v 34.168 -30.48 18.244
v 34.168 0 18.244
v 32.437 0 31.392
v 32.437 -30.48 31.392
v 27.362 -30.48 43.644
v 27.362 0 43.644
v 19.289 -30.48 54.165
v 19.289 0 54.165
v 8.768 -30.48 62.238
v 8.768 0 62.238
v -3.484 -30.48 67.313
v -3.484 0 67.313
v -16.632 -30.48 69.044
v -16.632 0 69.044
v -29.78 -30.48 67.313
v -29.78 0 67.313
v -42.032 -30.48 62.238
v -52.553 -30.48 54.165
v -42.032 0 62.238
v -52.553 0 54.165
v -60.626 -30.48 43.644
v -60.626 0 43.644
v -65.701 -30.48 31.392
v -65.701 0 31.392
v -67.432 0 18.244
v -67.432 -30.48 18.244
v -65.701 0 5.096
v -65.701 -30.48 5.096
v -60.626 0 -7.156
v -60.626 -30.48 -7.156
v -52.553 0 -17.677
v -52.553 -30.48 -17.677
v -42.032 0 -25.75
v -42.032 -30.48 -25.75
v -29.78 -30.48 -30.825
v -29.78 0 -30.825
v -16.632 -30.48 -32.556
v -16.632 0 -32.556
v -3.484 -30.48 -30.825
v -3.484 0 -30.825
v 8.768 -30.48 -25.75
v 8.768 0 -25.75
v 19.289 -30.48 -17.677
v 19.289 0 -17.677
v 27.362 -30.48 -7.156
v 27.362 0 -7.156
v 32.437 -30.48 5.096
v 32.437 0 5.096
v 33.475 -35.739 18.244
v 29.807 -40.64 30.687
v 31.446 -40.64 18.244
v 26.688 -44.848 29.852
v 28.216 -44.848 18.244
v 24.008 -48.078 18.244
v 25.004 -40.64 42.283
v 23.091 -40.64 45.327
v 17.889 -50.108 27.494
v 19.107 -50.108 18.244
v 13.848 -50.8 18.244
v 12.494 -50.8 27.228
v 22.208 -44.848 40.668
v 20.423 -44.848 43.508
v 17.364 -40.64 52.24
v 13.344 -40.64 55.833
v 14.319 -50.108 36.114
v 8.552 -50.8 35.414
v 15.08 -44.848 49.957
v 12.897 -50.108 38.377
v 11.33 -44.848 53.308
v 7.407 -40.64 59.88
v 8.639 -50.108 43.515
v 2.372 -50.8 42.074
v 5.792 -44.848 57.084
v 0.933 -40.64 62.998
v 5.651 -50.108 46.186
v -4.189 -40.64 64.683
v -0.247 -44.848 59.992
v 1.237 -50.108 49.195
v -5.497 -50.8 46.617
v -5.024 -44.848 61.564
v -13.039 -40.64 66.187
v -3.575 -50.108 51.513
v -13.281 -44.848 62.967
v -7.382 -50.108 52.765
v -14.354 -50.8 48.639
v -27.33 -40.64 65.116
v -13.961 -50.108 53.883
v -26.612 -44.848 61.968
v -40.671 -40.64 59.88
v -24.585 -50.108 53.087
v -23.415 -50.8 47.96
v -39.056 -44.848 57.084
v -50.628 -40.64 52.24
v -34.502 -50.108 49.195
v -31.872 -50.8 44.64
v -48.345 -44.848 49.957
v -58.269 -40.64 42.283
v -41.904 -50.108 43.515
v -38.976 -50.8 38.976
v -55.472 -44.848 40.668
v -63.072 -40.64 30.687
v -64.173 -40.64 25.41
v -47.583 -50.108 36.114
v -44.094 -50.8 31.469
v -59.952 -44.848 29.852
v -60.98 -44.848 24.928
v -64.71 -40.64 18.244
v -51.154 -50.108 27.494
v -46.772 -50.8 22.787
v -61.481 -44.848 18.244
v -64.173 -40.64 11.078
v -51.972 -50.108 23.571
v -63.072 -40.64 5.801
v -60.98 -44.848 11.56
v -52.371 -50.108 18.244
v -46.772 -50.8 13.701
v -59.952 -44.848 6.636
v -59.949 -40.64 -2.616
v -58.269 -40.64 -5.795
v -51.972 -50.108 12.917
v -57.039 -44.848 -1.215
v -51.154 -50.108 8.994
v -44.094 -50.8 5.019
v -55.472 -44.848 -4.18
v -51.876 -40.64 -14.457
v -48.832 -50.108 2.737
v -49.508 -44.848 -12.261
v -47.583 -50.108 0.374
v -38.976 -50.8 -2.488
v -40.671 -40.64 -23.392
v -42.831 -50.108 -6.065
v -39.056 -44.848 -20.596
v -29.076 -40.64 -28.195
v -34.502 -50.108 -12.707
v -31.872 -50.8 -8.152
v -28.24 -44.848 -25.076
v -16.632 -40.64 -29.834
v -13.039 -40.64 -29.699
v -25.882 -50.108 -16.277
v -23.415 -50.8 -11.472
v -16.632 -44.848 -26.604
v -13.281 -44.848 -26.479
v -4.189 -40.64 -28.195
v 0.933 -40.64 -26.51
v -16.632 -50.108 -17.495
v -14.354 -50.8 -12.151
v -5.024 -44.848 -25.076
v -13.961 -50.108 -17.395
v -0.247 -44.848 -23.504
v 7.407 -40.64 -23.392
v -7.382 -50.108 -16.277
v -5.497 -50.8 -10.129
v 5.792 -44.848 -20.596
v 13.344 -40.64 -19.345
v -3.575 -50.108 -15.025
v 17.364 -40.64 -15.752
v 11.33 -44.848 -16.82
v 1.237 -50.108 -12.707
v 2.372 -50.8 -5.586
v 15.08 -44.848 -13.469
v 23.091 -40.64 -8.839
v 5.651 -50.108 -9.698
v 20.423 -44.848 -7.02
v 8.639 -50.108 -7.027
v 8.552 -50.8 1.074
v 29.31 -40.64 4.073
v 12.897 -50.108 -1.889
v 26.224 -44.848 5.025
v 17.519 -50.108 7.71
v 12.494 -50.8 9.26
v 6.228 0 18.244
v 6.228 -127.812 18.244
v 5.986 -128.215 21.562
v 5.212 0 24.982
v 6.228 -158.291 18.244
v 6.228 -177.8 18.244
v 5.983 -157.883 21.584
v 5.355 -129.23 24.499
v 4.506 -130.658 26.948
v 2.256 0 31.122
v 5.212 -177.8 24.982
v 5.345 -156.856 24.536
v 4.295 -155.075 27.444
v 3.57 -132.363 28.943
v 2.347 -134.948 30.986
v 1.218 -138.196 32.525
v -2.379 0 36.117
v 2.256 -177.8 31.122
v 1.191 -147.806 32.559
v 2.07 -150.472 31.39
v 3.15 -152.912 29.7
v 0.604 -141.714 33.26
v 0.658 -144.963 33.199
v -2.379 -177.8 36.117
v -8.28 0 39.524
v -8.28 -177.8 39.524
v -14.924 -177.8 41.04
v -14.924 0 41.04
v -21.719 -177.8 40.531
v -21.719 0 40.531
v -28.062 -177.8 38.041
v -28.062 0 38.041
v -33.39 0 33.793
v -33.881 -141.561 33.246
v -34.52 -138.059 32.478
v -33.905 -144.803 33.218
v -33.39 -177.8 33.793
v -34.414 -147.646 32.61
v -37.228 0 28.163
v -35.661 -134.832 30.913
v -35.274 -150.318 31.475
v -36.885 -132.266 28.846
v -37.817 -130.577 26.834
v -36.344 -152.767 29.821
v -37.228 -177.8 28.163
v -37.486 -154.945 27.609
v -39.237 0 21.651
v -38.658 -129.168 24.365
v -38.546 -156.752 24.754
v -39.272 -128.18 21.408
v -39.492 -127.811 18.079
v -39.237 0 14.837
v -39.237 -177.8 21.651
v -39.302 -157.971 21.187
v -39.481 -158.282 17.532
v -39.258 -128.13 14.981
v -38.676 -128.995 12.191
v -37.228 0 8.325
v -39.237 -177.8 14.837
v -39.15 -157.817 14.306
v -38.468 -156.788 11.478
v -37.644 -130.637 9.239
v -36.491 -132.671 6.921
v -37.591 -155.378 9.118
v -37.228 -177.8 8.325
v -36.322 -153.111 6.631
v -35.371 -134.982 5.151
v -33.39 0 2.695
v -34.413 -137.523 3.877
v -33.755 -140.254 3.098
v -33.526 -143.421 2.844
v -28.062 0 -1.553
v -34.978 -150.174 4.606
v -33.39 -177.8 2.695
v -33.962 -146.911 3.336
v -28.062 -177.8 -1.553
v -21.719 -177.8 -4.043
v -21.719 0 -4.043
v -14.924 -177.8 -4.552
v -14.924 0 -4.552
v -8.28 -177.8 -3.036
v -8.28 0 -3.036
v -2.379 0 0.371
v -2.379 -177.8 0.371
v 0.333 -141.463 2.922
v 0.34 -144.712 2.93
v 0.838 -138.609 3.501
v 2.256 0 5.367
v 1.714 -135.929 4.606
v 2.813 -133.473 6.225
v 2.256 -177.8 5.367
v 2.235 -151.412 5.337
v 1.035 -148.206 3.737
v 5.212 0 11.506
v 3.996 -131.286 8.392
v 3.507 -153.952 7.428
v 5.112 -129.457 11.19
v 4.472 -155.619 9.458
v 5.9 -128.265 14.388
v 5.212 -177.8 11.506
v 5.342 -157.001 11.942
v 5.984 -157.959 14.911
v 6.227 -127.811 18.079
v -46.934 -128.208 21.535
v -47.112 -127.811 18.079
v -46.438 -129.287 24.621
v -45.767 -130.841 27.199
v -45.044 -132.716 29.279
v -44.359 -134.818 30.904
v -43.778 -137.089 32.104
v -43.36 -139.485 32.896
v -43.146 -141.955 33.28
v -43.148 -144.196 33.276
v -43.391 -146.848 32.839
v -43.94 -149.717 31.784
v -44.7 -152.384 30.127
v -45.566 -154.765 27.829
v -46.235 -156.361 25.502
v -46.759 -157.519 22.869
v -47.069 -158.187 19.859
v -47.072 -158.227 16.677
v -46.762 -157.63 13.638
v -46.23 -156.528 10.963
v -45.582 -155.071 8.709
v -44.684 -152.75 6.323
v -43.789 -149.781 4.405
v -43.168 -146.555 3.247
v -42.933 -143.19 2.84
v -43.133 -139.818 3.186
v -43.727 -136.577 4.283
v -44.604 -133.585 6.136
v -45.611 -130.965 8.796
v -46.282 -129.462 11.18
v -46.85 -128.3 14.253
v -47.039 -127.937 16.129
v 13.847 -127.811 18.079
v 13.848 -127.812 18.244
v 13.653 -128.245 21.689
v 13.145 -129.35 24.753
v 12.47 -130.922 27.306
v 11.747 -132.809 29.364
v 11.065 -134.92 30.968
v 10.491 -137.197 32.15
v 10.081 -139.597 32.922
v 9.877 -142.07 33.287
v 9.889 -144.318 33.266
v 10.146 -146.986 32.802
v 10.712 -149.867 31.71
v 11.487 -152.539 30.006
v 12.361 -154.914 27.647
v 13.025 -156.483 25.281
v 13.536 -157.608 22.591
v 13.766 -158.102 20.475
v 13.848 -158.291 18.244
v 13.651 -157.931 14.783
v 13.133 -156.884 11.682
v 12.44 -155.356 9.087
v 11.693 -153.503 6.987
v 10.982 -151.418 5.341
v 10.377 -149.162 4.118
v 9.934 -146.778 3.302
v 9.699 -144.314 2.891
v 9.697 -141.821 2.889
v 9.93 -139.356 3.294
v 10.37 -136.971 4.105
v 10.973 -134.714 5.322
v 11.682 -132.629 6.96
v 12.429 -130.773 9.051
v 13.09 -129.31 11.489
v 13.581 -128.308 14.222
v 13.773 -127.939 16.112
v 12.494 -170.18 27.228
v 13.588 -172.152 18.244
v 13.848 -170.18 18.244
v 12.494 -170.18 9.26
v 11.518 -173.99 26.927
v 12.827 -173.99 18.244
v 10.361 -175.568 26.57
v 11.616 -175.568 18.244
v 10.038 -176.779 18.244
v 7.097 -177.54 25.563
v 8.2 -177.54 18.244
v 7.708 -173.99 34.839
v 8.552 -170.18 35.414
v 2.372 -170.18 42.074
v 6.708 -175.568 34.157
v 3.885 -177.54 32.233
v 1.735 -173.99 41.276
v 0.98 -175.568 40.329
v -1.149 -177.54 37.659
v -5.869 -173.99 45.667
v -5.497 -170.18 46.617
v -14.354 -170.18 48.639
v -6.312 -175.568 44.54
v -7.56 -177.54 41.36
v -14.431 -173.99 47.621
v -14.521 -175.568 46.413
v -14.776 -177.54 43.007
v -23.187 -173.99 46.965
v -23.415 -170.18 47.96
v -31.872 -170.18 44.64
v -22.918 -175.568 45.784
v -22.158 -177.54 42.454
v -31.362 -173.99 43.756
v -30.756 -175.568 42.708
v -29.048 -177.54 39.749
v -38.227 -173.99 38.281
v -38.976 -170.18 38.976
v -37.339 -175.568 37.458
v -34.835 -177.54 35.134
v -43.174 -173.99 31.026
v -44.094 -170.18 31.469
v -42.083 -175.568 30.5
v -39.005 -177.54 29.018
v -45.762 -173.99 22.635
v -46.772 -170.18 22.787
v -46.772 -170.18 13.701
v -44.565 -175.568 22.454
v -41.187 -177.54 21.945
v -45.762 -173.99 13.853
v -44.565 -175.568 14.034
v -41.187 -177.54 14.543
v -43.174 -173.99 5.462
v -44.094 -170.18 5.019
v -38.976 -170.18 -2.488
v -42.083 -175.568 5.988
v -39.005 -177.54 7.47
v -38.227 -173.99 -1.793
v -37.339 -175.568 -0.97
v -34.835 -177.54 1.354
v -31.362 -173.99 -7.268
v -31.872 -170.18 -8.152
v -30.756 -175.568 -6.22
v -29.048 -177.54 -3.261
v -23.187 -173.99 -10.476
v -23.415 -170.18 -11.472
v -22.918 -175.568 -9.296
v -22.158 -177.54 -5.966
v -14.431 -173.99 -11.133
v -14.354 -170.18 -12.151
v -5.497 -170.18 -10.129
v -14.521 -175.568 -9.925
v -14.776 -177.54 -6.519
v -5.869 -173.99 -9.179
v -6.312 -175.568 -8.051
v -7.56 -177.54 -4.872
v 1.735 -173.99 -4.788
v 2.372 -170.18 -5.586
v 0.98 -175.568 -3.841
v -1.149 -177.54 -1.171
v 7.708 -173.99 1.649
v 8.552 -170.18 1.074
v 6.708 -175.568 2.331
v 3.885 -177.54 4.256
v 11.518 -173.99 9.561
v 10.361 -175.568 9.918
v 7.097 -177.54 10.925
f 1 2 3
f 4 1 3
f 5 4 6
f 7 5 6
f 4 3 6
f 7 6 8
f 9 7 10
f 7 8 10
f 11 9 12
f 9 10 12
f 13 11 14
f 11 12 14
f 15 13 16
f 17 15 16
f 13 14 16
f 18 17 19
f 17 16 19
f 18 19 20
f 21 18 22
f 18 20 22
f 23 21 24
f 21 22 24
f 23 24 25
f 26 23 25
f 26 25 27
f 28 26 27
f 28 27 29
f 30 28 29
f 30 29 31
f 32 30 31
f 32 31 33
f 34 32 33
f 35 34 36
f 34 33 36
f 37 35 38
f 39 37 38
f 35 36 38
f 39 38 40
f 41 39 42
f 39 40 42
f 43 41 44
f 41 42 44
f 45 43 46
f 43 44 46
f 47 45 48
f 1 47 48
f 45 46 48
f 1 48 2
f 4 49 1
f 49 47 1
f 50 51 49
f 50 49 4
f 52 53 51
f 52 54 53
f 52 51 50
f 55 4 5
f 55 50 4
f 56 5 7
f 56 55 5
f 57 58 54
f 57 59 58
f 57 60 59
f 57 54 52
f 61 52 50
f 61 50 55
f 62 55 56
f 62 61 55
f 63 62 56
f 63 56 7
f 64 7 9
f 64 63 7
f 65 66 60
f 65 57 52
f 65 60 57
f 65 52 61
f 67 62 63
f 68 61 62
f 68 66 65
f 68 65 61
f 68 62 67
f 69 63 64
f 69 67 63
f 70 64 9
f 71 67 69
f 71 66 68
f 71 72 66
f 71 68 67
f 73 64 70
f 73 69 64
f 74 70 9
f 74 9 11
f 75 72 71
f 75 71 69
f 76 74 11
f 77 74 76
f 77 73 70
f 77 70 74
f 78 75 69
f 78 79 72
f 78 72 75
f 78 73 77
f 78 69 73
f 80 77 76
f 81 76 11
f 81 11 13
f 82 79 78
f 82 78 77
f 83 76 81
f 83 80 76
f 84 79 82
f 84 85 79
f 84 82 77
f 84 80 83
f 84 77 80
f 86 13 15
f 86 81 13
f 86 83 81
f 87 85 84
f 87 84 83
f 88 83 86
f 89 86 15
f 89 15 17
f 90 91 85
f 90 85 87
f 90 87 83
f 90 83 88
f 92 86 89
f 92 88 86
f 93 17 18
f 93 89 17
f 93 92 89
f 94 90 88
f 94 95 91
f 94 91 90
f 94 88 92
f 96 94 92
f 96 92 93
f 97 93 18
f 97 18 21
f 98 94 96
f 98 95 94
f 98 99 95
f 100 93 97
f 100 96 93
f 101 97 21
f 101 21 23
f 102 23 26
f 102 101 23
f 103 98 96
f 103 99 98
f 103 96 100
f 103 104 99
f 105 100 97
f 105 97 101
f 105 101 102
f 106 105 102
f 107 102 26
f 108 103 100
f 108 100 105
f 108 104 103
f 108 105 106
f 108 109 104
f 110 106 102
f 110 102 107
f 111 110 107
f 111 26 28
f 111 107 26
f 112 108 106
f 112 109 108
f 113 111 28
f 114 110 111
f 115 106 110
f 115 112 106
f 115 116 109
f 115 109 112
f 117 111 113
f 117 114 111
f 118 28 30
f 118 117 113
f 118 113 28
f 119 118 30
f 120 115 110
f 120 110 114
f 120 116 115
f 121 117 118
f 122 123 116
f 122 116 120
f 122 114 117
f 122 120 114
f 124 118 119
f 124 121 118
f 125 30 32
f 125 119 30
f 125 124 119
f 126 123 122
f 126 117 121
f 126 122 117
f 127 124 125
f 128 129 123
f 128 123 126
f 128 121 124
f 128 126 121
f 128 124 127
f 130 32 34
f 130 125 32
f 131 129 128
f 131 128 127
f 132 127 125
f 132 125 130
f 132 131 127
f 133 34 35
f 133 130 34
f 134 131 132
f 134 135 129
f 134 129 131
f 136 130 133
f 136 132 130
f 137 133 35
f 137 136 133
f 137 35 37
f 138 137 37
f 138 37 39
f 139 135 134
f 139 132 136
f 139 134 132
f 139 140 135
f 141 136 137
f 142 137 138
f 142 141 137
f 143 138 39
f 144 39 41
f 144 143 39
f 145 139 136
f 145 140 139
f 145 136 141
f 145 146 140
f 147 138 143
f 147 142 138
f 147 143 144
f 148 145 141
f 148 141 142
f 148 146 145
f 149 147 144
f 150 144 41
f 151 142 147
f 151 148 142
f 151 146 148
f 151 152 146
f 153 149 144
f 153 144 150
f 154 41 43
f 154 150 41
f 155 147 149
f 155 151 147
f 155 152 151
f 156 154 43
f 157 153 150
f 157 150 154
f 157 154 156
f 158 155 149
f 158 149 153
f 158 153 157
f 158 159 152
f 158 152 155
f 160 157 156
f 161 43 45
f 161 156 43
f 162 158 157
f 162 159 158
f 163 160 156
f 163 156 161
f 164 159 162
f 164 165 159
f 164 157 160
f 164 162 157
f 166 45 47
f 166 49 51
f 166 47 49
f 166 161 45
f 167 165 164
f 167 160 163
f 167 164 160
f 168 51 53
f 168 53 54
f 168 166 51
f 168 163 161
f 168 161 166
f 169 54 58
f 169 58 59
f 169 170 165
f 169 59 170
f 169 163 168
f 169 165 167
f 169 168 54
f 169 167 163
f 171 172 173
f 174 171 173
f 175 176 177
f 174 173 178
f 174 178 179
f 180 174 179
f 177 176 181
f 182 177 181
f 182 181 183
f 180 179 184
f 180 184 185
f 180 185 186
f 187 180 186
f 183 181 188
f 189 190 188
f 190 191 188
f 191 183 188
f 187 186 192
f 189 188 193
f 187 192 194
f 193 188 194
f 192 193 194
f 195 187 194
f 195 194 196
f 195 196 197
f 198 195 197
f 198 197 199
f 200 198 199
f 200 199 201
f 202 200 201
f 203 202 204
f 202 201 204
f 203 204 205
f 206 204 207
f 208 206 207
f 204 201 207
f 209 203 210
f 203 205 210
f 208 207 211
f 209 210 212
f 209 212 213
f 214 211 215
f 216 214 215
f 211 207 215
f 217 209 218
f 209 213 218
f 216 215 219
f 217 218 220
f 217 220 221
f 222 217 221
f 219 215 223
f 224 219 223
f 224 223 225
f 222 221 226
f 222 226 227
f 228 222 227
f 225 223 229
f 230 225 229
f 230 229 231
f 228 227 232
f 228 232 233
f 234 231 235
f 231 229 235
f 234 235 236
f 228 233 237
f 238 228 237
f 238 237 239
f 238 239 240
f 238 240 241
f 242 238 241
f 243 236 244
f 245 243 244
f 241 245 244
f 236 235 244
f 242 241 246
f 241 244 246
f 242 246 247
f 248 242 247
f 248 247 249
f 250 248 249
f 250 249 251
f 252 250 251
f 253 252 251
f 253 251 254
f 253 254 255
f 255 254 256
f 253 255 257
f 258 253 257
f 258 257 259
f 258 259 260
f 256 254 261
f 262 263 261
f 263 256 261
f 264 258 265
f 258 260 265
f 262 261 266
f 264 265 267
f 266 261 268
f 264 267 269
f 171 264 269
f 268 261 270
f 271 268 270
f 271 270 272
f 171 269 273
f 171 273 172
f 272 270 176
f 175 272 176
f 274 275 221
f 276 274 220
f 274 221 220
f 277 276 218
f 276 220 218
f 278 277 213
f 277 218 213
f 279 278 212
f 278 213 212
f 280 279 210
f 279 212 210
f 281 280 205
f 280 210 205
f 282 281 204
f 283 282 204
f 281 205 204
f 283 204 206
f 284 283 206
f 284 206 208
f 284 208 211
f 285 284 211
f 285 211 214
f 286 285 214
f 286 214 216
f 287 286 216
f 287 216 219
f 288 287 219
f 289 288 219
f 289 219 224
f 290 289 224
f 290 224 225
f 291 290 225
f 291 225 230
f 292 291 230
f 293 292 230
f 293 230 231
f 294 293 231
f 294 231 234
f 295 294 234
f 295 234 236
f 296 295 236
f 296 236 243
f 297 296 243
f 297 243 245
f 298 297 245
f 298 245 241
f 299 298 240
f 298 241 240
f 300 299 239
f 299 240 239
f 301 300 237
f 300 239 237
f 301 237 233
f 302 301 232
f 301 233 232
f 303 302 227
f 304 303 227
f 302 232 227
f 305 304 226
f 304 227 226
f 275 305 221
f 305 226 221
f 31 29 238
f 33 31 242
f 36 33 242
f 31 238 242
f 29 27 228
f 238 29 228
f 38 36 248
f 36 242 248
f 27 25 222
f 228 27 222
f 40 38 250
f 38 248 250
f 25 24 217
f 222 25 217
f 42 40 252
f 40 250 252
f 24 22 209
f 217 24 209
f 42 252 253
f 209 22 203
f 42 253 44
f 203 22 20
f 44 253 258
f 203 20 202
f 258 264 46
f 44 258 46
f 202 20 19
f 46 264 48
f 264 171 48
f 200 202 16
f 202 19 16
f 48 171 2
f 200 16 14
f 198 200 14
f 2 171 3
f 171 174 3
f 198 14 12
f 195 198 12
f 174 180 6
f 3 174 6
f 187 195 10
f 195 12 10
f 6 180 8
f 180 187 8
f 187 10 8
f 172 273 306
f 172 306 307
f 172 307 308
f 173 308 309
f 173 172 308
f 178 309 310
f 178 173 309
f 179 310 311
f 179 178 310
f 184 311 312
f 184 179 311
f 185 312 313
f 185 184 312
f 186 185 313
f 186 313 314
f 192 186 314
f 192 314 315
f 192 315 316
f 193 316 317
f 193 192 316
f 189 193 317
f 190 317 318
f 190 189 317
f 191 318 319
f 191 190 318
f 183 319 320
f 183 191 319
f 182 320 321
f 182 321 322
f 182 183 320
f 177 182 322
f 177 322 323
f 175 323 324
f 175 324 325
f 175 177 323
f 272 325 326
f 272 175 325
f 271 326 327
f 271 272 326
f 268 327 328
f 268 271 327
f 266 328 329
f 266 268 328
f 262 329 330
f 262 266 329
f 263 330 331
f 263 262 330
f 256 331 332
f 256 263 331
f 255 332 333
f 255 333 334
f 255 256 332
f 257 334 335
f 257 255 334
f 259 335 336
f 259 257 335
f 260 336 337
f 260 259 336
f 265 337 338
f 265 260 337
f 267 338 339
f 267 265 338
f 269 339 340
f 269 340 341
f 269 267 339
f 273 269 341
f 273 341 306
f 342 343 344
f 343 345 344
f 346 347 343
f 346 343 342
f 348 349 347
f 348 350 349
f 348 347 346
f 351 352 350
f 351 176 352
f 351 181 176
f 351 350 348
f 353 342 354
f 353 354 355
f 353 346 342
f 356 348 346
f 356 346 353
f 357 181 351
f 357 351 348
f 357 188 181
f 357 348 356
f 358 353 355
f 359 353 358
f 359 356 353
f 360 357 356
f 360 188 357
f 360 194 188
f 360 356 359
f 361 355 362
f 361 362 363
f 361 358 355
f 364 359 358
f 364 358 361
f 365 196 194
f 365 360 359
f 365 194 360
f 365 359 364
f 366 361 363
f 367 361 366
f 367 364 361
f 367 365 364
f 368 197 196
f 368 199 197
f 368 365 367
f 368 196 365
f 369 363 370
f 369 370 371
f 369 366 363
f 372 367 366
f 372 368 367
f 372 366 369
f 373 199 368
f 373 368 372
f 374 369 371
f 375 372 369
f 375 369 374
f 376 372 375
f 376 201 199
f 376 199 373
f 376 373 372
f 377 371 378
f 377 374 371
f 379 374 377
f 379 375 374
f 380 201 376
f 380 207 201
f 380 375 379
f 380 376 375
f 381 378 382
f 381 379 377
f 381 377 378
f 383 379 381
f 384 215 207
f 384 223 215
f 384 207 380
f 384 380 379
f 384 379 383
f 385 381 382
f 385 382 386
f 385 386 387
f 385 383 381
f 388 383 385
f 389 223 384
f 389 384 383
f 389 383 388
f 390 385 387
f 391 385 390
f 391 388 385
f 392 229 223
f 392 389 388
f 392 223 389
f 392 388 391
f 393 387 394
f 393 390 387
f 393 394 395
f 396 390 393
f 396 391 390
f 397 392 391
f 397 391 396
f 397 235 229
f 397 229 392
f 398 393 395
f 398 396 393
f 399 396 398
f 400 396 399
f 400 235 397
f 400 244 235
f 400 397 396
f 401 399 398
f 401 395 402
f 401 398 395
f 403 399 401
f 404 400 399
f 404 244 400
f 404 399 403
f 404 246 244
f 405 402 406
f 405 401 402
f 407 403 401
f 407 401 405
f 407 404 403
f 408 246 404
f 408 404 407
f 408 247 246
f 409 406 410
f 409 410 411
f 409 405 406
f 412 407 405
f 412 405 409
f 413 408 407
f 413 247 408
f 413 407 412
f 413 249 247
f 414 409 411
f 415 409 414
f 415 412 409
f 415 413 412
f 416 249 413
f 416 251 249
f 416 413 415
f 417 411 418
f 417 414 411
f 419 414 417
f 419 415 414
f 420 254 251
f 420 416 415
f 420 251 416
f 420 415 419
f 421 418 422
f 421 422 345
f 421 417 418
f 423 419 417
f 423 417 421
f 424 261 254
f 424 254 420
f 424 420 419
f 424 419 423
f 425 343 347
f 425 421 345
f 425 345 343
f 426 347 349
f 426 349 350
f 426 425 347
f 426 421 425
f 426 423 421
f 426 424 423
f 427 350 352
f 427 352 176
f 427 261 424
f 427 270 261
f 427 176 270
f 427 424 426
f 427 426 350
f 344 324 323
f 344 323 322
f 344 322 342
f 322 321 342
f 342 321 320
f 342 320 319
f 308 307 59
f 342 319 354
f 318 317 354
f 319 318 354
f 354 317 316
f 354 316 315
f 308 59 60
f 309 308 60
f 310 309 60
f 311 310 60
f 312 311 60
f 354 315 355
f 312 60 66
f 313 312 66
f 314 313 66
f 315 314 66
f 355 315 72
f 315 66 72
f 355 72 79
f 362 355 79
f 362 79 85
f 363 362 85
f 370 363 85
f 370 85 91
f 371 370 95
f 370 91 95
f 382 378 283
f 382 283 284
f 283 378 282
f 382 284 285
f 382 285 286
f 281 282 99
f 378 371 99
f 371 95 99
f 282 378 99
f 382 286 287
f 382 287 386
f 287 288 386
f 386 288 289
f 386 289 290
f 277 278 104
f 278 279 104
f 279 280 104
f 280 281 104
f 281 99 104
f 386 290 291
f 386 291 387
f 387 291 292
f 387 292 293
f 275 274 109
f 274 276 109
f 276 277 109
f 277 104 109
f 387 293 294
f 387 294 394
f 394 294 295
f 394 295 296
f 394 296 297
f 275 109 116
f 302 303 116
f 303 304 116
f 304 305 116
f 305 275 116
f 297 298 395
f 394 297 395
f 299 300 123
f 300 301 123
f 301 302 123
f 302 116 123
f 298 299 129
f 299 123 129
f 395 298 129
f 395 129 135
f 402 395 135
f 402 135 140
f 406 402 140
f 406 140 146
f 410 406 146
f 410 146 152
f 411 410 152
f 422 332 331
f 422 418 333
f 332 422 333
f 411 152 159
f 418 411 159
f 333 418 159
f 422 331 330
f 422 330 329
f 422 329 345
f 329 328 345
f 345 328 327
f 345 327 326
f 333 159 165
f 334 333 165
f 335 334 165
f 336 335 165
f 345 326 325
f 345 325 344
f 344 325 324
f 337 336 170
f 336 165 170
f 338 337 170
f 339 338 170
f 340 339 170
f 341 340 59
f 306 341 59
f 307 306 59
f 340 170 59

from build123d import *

# Parameters (mm, degrees)
F0_R          = 50.8
F1_DEPTH      = 50.8
F2_R          = 20.32
F3_DEPTH      = 127
F4_R          = 7.62
F5_DEPTH      = 231.902
F6_R          = 15.24
F7_DEPTH      = 114.3
F7_DEPTH_BACK = 213.36


with BuildPart() as f1:
    # F0 (on Front) → F1 (new body)
    with BuildSketch(Plane.XZ):
        with Locations((-16.6321154684, 18.2440392673)):
            Circle(F0_R)
    extrude(amount=F1_DEPTH)

    # F2
    f2_edges = [f1.edges().sort_by_distance(p)[0] for p in [
        (-67.432115, -50.8, 18.244039),
    ]]
    fillet(f2_edges, radius=F2_R)

    # F3 (add): a face of the model
    f3_faces = [f1.faces().sort_by_distance(p)[0] for p in [
        (-16.6321154684, -50.8, 18.2440392673),
    ]]
    extrude(f3_faces, amount=F3_DEPTH)

    # F4
    f4_edges = [f1.edges().sort_by_distance(p)[0] for p in [
        (-47.112115, -177.8, 18.244039),
    ]]
    fillet(f4_edges, radius=F4_R)

    # F5 (cut): a face of the model
    f5_faces = [f1.faces().sort_by_distance(p)[0] for p in [
        (-16.6321154684, -177.8, 18.2440392673),
    ]]
    extrude(f5_faces, amount=-F5_DEPTH, mode=Mode.SUBTRACT)

    # F6 (on Right) → F7 (cut, two sides)
    with BuildSketch(Plane.YZ) as f7_sk:
        with Locations((-143.0514454842, 18.0790871382)):
            Circle(F6_R)
    extrude(amount=F7_DEPTH, mode=Mode.SUBTRACT)
    extrude(f7_sk.sketch, amount=-F7_DEPTH_BACK, mode=Mode.SUBTRACT)


solid = f1.part
